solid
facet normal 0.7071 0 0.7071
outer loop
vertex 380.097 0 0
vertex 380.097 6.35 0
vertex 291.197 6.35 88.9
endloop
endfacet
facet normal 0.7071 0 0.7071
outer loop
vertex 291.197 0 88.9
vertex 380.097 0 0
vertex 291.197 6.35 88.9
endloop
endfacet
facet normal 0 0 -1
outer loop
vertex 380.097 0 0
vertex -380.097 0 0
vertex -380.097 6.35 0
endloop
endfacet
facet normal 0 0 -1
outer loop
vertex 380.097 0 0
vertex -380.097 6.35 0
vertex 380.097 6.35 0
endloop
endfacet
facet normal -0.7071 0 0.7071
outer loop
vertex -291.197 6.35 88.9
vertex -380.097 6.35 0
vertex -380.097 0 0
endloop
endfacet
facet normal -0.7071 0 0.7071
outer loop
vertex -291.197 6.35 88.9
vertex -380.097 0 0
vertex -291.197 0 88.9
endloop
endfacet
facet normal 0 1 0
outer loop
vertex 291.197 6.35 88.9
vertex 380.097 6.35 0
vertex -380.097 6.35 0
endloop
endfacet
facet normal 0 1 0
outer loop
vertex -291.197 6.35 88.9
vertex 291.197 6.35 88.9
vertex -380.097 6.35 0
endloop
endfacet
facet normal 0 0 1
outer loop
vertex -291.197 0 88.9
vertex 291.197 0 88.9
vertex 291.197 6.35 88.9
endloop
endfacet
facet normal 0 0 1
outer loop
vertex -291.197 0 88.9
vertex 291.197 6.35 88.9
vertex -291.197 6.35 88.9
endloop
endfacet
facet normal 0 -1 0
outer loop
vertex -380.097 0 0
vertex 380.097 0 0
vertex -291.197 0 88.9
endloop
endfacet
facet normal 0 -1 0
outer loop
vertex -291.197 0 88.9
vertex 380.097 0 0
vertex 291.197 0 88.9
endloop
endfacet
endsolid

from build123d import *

# Parameters (mm, degrees)
BOSS_EXTRUDE1_DEPTH = 6.35
CUT_EXTRUDE1_DEPTH  = 609.6


with BuildPart() as part:
    # Sketch1 → Boss-Extrude1 (new body)
    with BuildSketch(Plane(origin=(0, 0, 0), x_dir=(1, 0, 0), z_dir=(0, 1, 0))):
        Polygon((-381, -88.9), (-469.9, 0), (469.9, 0), (381, -88.9), align=None)
    extrude(amount=BOSS_EXTRUDE1_DEPTH)

    # Sketch2 → Cut-Extrude1 (cut)
    with BuildSketch(Plane(origin=(0, 6.35, 0), x_dir=(1, 0, 0), z_dir=(0, 1, 0))):
        Polygon((-380.097438789, 0), (-291.197438789, -88.9), (-381, -88.9), (-469.9, 0), align=None)
    cut_extrude1 = extrude(amount=-CUT_EXTRUDE1_DEPTH, mode=Mode.SUBTRACT)

    # Mirror1: Cut-Extrude1 across plane
    add(cut_extrude1.mirror(Plane(origin=(0, 0, 0), x_dir=(0, 0, 1), z_dir=(1, 0, 0))), mode=Mode.SUBTRACT)


solid = part.part
